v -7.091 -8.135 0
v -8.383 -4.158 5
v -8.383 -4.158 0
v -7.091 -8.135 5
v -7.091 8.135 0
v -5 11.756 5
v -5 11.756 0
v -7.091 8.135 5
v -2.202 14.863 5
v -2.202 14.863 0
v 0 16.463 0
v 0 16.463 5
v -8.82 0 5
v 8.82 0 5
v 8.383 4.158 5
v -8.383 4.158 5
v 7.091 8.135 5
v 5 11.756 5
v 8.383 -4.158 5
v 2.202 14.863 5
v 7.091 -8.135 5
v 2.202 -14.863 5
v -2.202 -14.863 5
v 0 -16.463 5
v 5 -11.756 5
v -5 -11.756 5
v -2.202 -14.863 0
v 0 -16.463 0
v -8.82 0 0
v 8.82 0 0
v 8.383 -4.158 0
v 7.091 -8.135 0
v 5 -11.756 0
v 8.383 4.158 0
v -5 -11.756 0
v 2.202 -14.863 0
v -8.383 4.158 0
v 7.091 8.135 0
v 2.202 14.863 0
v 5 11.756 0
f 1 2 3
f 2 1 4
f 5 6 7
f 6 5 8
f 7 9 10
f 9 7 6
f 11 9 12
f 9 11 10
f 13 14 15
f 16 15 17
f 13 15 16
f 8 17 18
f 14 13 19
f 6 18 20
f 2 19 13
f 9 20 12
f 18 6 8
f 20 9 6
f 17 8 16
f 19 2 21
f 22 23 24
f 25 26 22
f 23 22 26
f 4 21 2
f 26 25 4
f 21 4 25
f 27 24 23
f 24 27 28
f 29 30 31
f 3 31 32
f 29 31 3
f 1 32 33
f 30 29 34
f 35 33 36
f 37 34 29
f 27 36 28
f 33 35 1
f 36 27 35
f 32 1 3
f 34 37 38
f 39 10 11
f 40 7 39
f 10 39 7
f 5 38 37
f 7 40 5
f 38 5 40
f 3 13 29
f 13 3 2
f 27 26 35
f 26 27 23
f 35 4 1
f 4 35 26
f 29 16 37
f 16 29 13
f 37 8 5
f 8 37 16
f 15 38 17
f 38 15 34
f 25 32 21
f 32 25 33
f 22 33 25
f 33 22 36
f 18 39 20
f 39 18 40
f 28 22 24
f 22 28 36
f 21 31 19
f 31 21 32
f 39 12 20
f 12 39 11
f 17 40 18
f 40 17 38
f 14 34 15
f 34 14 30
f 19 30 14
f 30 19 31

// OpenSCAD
intersection() {
translate([11.1803398875,0,0]) cylinder(5,20,20,center=false); 
rotate([0,0,180]) translate([11.1803398875,0,0]) cylinder(5,20,20,center=false); 
}
